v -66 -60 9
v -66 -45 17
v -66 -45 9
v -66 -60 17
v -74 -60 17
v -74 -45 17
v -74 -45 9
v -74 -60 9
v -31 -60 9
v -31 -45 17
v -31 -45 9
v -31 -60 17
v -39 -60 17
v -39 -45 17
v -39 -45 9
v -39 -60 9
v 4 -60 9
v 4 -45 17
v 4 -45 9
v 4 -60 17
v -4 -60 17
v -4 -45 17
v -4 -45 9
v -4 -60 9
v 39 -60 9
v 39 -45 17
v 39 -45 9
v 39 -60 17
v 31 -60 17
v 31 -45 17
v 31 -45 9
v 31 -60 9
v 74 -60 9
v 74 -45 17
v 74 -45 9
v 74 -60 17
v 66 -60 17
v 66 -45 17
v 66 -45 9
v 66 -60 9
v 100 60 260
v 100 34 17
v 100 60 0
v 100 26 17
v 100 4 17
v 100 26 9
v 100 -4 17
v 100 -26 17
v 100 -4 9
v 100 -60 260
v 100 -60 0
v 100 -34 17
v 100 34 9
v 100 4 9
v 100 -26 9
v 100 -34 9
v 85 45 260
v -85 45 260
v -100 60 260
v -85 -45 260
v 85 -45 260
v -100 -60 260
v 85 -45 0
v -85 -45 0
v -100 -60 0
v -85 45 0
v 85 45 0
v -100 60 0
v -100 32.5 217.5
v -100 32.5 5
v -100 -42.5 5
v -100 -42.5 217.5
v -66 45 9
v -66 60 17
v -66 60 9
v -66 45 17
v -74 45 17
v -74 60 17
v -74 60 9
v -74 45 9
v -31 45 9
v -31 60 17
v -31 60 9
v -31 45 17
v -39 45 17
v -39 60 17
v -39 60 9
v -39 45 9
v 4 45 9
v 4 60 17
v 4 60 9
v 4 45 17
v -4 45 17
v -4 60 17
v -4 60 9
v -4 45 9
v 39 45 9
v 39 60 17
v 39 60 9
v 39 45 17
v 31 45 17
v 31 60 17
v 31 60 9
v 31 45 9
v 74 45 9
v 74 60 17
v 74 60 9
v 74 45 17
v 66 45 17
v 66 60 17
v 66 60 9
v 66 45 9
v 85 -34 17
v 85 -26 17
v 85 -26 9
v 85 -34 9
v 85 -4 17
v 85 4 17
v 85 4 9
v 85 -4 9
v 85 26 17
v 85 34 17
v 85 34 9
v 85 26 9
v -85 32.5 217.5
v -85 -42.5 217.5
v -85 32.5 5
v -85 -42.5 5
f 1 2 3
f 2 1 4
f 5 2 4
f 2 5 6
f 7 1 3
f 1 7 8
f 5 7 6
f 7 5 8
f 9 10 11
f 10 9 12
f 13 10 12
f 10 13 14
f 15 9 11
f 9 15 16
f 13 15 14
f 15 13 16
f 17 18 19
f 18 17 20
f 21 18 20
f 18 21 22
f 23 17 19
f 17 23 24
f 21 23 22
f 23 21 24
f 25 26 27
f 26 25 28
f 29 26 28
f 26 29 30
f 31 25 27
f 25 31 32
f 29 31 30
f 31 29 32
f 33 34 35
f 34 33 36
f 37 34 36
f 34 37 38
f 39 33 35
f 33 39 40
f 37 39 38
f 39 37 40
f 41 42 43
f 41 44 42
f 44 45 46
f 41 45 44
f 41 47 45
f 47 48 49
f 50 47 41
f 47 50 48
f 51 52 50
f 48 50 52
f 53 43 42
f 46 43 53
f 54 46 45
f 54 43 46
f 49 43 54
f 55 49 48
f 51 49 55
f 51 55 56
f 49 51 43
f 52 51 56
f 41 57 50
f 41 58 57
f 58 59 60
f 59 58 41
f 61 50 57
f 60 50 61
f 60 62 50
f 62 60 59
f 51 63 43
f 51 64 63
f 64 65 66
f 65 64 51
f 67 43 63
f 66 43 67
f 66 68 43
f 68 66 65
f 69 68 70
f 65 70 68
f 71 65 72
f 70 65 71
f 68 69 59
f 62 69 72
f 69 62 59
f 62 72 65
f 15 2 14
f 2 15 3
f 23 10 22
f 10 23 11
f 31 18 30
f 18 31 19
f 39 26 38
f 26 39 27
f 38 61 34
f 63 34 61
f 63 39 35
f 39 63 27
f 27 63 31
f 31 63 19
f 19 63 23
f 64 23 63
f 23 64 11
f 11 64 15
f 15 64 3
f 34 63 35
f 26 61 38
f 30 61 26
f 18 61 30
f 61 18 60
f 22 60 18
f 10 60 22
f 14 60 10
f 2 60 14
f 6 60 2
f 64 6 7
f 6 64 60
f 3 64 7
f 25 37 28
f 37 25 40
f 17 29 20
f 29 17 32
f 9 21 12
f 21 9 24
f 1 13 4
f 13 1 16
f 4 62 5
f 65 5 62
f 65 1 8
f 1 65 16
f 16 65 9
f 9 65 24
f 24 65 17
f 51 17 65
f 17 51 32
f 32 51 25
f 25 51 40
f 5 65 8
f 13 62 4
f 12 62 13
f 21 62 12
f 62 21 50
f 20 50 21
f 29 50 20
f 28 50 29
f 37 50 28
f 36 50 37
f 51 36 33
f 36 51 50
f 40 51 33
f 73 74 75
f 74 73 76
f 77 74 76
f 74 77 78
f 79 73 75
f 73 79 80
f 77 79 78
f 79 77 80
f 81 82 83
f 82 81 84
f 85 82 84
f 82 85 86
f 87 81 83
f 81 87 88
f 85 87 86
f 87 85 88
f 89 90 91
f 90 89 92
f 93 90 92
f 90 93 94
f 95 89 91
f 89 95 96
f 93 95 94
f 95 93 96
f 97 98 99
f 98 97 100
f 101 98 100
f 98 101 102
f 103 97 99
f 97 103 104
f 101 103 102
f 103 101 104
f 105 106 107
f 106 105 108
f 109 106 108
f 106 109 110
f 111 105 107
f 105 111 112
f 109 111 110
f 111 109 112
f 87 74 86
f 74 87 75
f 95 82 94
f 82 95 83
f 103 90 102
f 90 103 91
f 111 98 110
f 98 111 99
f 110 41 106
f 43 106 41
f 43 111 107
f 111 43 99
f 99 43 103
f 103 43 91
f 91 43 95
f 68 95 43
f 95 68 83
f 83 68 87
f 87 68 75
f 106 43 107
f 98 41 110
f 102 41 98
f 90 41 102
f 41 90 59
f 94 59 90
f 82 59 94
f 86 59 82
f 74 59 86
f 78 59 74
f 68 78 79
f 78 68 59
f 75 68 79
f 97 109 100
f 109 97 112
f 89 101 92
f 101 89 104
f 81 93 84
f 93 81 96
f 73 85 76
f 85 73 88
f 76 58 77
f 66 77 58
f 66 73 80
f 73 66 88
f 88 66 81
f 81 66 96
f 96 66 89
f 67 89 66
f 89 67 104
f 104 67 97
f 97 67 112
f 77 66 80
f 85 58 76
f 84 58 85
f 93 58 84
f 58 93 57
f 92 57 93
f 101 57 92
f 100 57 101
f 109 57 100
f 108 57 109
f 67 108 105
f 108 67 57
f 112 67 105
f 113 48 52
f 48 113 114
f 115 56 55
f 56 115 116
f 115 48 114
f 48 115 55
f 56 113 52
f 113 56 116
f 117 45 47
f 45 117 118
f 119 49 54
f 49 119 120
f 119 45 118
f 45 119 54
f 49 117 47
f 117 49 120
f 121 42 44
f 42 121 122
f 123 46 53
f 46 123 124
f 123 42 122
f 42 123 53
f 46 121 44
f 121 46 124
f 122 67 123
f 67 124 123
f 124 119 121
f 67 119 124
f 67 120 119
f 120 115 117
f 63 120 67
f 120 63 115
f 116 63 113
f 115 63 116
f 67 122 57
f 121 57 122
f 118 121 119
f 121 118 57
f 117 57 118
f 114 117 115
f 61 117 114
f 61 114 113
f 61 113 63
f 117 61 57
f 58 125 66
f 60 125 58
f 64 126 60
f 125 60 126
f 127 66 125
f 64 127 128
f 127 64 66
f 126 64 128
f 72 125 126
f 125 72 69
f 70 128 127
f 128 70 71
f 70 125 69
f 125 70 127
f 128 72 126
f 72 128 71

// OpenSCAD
module pumproom(width=120, length=200, wall_thickness=15, wall_height=260) 
{
    // Door opening size. Then we need some extra space for the door frame.
    door_width = 70+5;
    door_height = 210+2.5;
    
    // Position the door so that bottom of opening is 5 cm above floor level
    door_y_pos = (wall_height-door_height)/2 - 5;
    
    // Position the door horizontally off the center.
    door_x_pos = -5;
   
    // Hole size, 8 cm
    hole_size = 8;

difference() {
    translate([0,-width/2+wall_thickness/2, wall_height/2]) cube([length, wall_thickness, wall_height],center=true);

   n_holes = 5;
    for (x = [0: n_holes-1]) {
        translate([(x-(n_holes-1)/2) * ((length-4*wall_thickness)/(n_holes-1)), -width/2+wall_thickness/2, wall_height/20]) cube([hole_size, 1+wall_thickness, hole_size],center=true);
    }
}

    difference() {
        translate([0,width/2-wall_thickness/2, wall_height/2]) cube([length, wall_thickness, wall_height],center=true);
     
       n_holes = 5;
        for (x = [0: n_holes-1]) {
            translate([(x-(n_holes-1)/2) * ((length-4*wall_thickness)/(n_holes-1)), width/2-wall_thickness/2, wall_height/20]) cube([hole_size, 1+wall_thickness, hole_size],center=true);
        }
    }
    
    difference() {
        translate([length/2-wall_thickness/2, 0, wall_height/2]) cube([wall_thickness, width, wall_height],center=true);
        
        n_holes2 = 3;
        for (x = [0: n_holes2-1]) {
            translate([length/2-wall_thickness/2, (x-(n_holes2-1)/2) * ((width-4*wall_thickness)/(n_holes2-1)), wall_height/20]) cube([1+wall_thickness, hole_size, hole_size],center=true);
        }
    }     

    difference() {
        translate([-length/2+wall_thickness/2, 0, wall_height/2]) cube([wall_thickness, width, wall_height],center=true);

        translate([-length/2+wall_thickness/2, door_x_pos, wall_height/2-door_y_pos]) cube([wall_thickness+1, door_width, door_height],center=true);
    }
}

// For testing
pumproom();
